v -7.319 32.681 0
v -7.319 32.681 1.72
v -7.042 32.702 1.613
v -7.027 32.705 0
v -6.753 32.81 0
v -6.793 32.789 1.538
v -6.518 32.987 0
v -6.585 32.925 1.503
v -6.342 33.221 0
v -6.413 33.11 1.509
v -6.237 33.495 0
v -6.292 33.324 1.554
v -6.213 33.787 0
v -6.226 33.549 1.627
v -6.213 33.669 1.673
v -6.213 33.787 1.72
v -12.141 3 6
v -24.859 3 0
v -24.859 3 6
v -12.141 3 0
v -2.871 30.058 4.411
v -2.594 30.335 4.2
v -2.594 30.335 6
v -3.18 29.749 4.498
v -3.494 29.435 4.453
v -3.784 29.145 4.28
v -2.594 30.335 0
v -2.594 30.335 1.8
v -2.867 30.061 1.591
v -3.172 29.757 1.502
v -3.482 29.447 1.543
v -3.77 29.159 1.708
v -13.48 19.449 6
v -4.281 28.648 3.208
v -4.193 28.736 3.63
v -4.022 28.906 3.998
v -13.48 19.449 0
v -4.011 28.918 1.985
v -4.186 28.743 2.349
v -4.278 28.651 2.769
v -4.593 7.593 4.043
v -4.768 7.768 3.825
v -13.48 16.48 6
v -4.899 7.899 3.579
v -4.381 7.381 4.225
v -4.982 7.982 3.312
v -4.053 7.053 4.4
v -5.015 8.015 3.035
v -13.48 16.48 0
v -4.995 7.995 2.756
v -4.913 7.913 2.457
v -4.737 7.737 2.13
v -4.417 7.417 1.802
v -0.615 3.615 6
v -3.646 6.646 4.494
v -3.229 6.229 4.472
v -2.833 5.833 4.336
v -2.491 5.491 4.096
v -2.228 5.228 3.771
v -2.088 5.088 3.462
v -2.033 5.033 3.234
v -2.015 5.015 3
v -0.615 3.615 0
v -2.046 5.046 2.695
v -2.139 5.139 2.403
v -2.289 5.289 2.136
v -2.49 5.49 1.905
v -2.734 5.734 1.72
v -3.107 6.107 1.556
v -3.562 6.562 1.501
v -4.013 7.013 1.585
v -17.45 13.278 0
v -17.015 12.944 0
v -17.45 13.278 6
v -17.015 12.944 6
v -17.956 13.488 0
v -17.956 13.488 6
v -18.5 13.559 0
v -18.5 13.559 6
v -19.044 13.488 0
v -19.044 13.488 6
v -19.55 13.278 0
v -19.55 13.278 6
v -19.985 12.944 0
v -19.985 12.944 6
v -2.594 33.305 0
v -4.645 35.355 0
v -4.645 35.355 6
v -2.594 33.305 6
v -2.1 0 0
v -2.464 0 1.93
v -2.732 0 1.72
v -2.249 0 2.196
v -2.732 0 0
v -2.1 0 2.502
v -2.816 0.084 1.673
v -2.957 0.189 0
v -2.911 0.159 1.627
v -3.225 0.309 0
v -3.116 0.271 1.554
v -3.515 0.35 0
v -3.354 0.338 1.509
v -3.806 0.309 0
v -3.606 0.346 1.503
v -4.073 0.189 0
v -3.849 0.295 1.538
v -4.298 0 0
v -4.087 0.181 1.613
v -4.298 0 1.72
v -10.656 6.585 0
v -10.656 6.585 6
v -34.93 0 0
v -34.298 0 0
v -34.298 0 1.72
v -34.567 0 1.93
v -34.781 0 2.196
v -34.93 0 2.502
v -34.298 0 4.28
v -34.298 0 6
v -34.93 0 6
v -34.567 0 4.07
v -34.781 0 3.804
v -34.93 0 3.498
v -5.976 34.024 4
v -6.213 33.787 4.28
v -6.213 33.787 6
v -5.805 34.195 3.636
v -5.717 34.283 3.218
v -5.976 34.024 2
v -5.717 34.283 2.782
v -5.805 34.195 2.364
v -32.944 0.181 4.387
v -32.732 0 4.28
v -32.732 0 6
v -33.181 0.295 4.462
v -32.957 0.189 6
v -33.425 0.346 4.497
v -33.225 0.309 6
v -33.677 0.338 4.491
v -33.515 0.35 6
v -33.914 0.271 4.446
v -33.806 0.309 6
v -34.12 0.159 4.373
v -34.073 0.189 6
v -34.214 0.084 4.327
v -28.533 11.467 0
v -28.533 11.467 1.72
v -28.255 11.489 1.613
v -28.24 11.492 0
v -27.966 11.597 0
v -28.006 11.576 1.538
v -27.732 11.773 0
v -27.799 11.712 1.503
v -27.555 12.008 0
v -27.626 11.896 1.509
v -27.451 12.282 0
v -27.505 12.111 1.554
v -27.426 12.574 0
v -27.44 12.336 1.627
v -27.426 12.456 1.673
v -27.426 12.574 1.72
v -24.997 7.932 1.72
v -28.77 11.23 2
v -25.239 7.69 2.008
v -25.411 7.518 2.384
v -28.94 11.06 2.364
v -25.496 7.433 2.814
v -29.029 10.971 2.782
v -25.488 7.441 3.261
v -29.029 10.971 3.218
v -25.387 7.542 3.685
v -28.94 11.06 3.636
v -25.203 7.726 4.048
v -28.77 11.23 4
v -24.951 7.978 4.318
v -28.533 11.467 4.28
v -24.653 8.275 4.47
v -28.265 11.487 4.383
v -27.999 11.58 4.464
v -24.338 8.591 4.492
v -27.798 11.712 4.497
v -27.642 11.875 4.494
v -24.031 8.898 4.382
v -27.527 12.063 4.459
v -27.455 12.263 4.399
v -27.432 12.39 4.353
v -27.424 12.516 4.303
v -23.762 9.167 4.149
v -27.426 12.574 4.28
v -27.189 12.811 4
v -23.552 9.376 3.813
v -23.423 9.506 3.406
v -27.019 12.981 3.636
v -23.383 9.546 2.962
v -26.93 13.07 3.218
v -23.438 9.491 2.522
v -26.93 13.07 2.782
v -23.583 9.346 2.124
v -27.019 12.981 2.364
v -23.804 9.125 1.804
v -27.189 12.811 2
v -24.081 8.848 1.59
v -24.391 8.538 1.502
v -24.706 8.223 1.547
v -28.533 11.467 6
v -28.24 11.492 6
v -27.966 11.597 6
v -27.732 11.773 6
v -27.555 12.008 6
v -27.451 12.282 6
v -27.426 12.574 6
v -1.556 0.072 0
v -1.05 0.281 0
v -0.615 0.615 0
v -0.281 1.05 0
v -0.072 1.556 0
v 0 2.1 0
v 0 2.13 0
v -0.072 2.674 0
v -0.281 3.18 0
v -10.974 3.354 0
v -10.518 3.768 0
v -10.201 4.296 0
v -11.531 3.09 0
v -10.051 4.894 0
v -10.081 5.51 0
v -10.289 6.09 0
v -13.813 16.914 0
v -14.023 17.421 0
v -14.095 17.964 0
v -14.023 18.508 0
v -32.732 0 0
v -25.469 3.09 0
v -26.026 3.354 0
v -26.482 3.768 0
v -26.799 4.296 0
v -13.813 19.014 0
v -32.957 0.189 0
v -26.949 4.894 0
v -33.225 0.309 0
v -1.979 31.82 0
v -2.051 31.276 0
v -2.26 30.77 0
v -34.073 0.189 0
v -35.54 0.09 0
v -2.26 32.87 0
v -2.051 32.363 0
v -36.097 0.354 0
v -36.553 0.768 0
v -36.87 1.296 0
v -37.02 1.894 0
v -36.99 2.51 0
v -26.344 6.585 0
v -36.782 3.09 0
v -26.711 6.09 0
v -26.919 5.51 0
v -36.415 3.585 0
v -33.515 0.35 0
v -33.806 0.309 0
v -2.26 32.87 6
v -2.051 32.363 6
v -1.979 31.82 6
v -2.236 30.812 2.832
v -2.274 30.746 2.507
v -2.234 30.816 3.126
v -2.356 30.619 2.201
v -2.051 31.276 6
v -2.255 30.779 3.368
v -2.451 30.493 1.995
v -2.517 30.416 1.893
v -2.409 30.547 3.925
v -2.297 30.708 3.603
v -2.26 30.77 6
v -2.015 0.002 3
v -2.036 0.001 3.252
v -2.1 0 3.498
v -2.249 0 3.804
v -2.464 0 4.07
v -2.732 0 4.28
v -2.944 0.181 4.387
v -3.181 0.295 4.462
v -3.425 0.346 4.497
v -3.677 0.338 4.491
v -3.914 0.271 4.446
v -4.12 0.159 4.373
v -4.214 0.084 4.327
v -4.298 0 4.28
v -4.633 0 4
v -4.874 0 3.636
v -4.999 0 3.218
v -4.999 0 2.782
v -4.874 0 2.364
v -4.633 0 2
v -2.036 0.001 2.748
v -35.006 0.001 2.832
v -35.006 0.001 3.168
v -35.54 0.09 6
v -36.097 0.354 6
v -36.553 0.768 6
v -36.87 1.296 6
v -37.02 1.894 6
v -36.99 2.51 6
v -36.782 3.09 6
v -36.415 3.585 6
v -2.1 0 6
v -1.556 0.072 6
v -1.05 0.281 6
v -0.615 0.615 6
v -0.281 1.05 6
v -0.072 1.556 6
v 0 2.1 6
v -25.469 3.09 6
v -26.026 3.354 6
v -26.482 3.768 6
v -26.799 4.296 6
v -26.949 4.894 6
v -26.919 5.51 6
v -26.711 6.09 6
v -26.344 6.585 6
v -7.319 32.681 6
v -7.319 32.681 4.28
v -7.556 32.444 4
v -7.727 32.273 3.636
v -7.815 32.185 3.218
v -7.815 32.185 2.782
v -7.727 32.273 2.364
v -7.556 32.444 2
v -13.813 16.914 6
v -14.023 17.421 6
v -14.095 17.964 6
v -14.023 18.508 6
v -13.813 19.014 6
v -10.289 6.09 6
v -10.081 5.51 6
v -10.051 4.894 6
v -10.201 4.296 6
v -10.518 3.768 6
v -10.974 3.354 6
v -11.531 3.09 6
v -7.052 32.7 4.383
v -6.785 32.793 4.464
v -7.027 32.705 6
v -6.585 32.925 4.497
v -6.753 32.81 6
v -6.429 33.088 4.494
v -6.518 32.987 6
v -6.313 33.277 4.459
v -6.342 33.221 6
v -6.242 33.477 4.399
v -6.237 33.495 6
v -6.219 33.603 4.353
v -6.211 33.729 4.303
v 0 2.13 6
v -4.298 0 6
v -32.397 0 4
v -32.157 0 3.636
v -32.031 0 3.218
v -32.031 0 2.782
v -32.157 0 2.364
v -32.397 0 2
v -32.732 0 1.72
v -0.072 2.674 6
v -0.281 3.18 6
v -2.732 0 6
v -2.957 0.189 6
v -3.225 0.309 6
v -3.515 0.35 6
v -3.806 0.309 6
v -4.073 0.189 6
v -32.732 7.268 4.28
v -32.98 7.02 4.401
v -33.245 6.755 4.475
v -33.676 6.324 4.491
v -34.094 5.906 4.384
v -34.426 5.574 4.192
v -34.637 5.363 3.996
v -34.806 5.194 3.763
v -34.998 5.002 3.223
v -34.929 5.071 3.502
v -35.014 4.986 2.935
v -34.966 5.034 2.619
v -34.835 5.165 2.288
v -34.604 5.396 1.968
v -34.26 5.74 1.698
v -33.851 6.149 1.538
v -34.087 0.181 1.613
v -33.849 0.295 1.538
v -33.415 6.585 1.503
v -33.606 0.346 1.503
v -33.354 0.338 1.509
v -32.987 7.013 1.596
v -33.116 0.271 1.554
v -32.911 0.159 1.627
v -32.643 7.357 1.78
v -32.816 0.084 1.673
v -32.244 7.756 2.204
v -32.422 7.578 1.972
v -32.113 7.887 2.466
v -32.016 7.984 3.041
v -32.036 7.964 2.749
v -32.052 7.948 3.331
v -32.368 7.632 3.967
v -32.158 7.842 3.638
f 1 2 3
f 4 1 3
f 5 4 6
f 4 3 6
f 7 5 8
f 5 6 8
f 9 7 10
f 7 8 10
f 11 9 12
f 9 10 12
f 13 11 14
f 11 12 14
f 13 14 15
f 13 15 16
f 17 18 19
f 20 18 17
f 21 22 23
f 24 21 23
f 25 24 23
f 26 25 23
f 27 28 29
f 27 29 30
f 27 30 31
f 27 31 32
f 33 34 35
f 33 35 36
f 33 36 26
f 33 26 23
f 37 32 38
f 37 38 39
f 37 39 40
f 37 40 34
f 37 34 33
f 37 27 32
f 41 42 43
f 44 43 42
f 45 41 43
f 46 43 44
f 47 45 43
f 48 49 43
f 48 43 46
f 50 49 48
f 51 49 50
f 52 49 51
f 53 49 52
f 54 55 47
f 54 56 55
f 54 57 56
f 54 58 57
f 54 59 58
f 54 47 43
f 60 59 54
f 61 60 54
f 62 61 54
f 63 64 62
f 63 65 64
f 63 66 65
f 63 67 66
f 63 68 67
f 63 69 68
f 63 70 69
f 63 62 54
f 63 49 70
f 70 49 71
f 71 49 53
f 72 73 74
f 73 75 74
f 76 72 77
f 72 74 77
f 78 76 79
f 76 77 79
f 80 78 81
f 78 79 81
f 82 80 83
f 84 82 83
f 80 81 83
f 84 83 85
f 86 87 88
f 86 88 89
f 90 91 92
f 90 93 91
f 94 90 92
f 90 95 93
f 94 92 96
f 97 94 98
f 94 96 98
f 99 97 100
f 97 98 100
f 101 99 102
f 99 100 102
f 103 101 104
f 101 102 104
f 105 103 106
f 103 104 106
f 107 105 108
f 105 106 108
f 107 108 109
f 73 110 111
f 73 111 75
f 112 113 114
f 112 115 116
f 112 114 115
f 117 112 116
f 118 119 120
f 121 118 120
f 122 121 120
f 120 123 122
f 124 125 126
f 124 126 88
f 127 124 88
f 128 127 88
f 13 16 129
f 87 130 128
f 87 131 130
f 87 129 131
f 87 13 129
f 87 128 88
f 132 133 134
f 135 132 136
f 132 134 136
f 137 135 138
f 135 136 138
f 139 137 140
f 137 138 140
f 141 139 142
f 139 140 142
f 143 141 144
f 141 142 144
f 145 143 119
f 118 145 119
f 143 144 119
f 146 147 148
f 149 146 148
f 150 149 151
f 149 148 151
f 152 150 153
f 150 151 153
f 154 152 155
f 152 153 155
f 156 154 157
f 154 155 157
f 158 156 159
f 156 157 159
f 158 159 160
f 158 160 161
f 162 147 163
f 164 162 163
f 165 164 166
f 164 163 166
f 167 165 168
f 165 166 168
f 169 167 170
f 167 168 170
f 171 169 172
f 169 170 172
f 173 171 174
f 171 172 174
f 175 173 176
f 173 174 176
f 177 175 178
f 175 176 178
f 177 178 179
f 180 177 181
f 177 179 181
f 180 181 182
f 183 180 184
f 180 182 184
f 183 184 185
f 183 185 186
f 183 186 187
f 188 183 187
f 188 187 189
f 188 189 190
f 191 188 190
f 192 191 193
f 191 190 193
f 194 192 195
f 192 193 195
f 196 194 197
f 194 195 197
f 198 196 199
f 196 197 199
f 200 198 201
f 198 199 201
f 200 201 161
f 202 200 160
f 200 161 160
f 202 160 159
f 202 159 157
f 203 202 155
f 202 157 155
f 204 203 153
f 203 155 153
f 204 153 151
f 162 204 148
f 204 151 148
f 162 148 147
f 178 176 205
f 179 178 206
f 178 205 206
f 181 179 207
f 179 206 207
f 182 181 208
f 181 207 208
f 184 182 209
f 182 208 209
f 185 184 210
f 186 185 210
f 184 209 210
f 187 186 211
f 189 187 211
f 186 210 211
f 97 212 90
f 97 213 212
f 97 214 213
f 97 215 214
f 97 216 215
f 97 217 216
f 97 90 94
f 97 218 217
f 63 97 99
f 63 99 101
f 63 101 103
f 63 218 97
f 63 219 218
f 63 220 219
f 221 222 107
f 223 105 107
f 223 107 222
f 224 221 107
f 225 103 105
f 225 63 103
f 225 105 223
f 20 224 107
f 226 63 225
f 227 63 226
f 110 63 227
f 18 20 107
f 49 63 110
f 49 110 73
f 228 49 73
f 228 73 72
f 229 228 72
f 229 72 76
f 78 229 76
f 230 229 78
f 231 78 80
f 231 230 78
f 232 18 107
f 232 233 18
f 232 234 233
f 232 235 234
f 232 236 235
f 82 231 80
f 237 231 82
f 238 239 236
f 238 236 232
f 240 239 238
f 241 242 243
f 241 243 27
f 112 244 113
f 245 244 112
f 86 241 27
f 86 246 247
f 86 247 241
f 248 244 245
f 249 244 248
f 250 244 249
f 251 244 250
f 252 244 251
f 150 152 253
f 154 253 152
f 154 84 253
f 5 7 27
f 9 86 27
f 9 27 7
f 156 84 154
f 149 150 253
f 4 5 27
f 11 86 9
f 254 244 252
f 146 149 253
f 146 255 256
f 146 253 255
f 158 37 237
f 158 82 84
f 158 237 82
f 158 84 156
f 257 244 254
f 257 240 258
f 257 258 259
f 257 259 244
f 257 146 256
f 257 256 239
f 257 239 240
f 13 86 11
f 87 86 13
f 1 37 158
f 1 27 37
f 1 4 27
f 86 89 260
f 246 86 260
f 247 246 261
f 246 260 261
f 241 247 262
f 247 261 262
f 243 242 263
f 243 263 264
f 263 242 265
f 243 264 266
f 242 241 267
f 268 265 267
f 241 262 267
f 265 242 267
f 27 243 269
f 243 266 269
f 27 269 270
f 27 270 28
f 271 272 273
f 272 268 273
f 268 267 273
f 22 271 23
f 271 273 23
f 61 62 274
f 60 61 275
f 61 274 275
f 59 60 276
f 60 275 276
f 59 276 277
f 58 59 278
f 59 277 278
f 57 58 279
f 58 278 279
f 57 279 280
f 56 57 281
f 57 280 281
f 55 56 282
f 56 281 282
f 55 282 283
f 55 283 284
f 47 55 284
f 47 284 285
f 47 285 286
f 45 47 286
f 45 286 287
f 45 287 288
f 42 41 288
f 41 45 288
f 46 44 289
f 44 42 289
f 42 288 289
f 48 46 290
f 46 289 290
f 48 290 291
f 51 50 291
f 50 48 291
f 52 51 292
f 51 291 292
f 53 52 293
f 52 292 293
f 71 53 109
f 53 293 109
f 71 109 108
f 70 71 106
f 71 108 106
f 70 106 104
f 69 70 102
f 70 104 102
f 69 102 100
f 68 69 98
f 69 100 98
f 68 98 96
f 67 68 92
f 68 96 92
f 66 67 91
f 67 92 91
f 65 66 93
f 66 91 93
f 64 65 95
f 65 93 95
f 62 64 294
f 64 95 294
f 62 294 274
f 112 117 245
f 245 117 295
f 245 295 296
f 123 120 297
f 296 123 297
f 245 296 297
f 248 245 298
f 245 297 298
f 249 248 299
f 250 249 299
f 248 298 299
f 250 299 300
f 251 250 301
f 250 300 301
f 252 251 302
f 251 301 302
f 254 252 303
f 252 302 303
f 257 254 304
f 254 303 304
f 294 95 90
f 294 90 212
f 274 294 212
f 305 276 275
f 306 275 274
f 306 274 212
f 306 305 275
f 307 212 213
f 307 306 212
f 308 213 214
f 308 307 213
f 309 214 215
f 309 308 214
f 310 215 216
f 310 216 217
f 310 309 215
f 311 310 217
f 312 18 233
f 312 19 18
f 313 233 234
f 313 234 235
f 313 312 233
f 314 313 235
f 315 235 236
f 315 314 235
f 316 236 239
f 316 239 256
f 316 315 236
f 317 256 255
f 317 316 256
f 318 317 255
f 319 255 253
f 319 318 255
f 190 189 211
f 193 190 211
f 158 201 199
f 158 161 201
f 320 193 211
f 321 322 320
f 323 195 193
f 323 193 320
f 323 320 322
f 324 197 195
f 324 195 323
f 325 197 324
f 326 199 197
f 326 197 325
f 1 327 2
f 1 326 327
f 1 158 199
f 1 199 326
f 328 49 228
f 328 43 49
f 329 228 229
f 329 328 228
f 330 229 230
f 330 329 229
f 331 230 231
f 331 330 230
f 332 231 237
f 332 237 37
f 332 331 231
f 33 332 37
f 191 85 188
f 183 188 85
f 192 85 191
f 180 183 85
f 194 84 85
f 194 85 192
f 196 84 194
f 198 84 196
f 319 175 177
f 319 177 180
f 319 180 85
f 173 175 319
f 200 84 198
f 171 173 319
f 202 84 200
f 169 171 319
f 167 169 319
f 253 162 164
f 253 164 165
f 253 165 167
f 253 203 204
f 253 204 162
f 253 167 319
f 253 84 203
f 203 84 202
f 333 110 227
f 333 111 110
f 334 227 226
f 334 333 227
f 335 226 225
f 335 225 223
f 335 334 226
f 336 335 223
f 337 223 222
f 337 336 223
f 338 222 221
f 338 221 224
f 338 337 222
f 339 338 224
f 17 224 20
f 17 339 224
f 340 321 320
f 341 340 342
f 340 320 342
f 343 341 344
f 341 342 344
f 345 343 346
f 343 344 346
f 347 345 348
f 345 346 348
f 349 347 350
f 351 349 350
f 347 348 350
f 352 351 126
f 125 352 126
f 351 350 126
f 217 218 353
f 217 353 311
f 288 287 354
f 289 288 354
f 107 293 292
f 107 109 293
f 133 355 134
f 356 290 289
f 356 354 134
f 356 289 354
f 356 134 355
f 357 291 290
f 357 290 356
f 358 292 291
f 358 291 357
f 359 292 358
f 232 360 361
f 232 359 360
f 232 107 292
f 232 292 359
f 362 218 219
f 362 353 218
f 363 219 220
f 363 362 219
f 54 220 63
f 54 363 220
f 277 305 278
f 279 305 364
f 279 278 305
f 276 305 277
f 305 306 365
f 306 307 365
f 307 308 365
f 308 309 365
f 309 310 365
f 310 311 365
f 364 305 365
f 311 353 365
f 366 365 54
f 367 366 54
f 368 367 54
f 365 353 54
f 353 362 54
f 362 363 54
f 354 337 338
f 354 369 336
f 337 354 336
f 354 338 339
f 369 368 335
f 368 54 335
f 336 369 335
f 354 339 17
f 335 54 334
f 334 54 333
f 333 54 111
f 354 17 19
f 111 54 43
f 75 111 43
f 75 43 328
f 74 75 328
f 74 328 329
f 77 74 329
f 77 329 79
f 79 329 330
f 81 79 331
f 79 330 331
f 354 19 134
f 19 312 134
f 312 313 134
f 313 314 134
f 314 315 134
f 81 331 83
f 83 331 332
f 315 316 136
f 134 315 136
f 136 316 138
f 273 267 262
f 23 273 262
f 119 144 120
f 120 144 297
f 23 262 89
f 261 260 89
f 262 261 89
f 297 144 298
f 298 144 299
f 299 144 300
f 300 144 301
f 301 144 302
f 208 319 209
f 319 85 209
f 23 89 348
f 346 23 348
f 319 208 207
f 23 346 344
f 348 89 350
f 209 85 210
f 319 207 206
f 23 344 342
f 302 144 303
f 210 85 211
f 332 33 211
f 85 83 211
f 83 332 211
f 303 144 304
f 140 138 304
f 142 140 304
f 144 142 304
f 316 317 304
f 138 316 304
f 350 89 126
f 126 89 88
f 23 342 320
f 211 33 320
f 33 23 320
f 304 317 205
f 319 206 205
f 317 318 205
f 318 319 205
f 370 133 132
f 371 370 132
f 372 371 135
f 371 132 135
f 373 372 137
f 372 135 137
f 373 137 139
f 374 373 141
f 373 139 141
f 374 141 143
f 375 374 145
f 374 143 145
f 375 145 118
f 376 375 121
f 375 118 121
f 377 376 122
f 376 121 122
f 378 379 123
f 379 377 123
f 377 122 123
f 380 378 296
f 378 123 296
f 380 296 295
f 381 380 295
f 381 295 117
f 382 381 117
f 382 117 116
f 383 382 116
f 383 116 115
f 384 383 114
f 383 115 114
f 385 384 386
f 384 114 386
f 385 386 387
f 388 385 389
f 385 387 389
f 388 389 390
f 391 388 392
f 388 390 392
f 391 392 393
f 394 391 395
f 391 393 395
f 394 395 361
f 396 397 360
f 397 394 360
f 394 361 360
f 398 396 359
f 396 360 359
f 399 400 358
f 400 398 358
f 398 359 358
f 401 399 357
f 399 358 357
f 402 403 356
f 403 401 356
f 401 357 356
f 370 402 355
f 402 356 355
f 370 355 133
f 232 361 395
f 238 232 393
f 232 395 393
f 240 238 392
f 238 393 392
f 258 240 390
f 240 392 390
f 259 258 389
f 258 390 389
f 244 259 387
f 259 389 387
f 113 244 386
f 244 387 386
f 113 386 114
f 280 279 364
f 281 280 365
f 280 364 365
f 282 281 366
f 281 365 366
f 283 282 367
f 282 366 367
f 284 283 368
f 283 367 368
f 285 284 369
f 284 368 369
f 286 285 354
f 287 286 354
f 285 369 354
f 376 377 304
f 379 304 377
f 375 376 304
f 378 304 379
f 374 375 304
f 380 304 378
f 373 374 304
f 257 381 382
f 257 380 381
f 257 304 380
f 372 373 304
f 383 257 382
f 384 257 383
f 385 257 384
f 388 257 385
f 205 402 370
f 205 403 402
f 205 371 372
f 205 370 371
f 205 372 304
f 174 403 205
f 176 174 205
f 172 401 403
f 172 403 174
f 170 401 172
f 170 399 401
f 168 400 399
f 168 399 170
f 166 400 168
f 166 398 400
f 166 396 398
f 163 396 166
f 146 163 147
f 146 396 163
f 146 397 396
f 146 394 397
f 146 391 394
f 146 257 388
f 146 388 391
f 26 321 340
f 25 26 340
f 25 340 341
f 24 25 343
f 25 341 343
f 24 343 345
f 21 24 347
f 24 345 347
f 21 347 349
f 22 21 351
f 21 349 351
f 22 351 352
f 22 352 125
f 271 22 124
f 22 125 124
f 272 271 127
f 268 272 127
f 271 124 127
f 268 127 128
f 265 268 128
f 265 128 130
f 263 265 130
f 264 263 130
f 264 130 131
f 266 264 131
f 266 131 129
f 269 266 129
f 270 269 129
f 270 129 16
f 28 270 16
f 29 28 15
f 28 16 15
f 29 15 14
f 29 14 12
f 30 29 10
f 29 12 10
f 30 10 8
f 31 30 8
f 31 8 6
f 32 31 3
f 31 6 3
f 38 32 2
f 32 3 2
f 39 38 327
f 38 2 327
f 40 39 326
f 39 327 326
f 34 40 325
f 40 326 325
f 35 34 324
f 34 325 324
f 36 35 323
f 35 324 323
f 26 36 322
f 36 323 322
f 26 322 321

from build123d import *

# Parameters (mm, degrees)
EXTRUDE_1_DEPTH     = 6
FILLET_1_R          = 2.1
SKETCH_2_R          = 1.05
CUT_EXTRUDE_1_DEPTH = 52.548347418
CUT_EXTRUDE_2_REACH = 30.914
SKETCH_3_R          = 1.5
CUT_EXTRUDE_3_REACH = 53.548
SKETCH_4_R          = 1.5


with BuildPart() as part:
    # ｽｹｯﾁ1 → ﾎﾞｽ - 押し出し1 (new body)
    with BuildSketch(Plane.XY):
        Polygon((0, 0), (-40, 0), (-4.644660941, 35.355339059), (-1.109127035, 31.819805153), (-14.964466094, 17.964466094), (0, 3), align=None)
        Polygon((-18.5, 14.428932188), (-29.928932188, 3), (-7.071067812, 3), align=None, mode=Mode.SUBTRACT)
    extrude(amount=EXTRUDE_1_DEPTH)

    # ﾌｨﾚｯﾄ1
    fillet_1_edges = [part.edges().sort_by_distance(p)[0] for p in [
        (0, 0, 3),
        (-40, 0, 3),
        (-1.109127035, 31.819805153, 3),
        (-14.964466094, 17.964466094, 3),
        (0, 3, 3),
        (-7.071067812, 3, 3),
        (-18.5, 14.428932188, 3),
        (-29.928932188, 3, 3),
    ]]
    fillet(fillet_1_edges, radius=FILLET_1_R)

    # ｽｹｯﾁ2 → ｶｯﾄ - 押し出し1 (cut, through all)
    with BuildSketch(Plane.XY.offset(6)):
        with Locations((-33.51507576, -0.7)):
            Circle(SKETCH_2_R)
        with Locations((-3.51507576, -0.7)):
            Circle(SKETCH_2_R)
        with Locations((-7.260956031, 33.728993463)):
            Circle(SKETCH_2_R)
        with Locations((-28.474159467, 12.515790027)):
            Circle(SKETCH_2_R)
    extrude(amount=-CUT_EXTRUDE_1_DEPTH, mode=Mode.SUBTRACT)

    # ｽｹｯﾁ3 → ｶｯﾄ - 押し出し2 (cut, up to next)
    with BuildSketch(Plane(origin=(-20, 20, 0), x_dir=(0, 0, 1), z_dir=(-0.7071067811865439, 0.7071067811865511, 0)), mode=Mode.PRIVATE) as cut_extrude_2_sk1:
        with Locations(Location((3, 18.715728753, 0), (0, 0, 328.550342674))):
            Circle(SKETCH_3_R)
    cut_extrude_2_tool1 = extrude(cut_extrude_2_sk1.sketch, amount=-CUT_EXTRUDE_2_REACH, mode=Mode.PRIVATE) & part.part
    # ｽｹｯﾁ3 → ｶｯﾄ - 押し出し2 (cut, up to next)
    with BuildSketch(Plane(origin=(-20, 20, 0), x_dir=(0, 0, 1), z_dir=(-0.7071067811865439, 0.7071067811865511, 0)), mode=Mode.PRIVATE) as cut_extrude_2_sk2:
        with Locations(Location((3, -11.284271247, 0), (0, 0, 211.449657326))):
            Circle(SKETCH_3_R)
    cut_extrude_2_tool2 = extrude(cut_extrude_2_sk2.sketch, amount=-CUT_EXTRUDE_2_REACH, mode=Mode.PRIVATE) & part.part
    add(cut_extrude_2_tool1.solids().sort_by_distance((-6.765981, 33.234019, 3))[0], mode=Mode.SUBTRACT)
    add(cut_extrude_2_tool2.solids().sort_by_distance((-27.979185, 12.020815, 3))[0], mode=Mode.SUBTRACT)

    # ｽｹｯﾁ4 → ｶｯﾄ - 押し出し3 (cut, up to next)
    with BuildSketch(Plane.XZ, mode=Mode.PRIVATE) as cut_extrude_3_sk1:
        with Locations(Location((-33.51507576, 3, 0), (0, 0, 58.550342674))):
            Circle(SKETCH_4_R)
    cut_extrude_3_tool1 = extrude(cut_extrude_3_sk1.sketch, amount=-CUT_EXTRUDE_3_REACH, mode=Mode.PRIVATE) & part.part
    # ｽｹｯﾁ4 → ｶｯﾄ - 押し出し3 (cut, up to next)
    with BuildSketch(Plane.XZ, mode=Mode.PRIVATE) as cut_extrude_3_sk2:
        with Locations((-3.51507576, 3)):
            Circle(SKETCH_4_R)
    cut_extrude_3_tool2 = extrude(cut_extrude_3_sk2.sketch, amount=-CUT_EXTRUDE_3_REACH, mode=Mode.PRIVATE) & part.part
    add(cut_extrude_3_tool1.solids().sort_by_distance((-33.515076, 0, 3))[0], mode=Mode.SUBTRACT)
    add(cut_extrude_3_tool2.solids().sort_by_distance((-3.515076, 0, 3))[0], mode=Mode.SUBTRACT)


solid = part.part
